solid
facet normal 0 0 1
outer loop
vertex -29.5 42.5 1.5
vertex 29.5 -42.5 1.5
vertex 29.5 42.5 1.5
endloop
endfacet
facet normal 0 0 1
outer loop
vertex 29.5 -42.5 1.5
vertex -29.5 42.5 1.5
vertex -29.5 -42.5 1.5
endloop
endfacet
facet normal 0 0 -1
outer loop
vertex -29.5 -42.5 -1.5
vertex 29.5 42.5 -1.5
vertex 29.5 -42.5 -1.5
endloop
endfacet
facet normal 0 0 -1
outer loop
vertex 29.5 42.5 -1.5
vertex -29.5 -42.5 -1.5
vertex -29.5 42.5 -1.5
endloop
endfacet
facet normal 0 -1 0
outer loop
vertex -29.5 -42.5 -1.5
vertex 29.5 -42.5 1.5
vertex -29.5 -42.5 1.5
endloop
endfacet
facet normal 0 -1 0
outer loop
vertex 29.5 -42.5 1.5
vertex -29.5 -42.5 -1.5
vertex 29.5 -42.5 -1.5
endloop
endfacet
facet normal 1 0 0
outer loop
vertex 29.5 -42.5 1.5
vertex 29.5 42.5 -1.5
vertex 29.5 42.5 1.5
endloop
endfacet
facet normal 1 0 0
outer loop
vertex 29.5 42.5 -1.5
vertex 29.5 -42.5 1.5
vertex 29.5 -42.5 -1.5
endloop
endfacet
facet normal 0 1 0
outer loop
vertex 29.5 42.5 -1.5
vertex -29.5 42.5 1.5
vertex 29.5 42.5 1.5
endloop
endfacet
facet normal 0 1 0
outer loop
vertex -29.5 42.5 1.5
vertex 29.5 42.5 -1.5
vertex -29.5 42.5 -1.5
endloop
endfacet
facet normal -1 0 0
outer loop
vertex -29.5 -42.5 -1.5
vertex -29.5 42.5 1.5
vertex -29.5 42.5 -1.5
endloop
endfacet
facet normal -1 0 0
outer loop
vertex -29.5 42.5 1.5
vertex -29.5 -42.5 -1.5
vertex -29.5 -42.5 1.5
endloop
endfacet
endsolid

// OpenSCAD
card_x = 54;
card_y = 80;
card_space = 2;
wall_thickness = 3;
plate_height = 3;
wall_height = 10;

cube(size = [card_x+card_space+wall_thickness, card_y+card_space+wall_thickness,plate_height], center = true);
